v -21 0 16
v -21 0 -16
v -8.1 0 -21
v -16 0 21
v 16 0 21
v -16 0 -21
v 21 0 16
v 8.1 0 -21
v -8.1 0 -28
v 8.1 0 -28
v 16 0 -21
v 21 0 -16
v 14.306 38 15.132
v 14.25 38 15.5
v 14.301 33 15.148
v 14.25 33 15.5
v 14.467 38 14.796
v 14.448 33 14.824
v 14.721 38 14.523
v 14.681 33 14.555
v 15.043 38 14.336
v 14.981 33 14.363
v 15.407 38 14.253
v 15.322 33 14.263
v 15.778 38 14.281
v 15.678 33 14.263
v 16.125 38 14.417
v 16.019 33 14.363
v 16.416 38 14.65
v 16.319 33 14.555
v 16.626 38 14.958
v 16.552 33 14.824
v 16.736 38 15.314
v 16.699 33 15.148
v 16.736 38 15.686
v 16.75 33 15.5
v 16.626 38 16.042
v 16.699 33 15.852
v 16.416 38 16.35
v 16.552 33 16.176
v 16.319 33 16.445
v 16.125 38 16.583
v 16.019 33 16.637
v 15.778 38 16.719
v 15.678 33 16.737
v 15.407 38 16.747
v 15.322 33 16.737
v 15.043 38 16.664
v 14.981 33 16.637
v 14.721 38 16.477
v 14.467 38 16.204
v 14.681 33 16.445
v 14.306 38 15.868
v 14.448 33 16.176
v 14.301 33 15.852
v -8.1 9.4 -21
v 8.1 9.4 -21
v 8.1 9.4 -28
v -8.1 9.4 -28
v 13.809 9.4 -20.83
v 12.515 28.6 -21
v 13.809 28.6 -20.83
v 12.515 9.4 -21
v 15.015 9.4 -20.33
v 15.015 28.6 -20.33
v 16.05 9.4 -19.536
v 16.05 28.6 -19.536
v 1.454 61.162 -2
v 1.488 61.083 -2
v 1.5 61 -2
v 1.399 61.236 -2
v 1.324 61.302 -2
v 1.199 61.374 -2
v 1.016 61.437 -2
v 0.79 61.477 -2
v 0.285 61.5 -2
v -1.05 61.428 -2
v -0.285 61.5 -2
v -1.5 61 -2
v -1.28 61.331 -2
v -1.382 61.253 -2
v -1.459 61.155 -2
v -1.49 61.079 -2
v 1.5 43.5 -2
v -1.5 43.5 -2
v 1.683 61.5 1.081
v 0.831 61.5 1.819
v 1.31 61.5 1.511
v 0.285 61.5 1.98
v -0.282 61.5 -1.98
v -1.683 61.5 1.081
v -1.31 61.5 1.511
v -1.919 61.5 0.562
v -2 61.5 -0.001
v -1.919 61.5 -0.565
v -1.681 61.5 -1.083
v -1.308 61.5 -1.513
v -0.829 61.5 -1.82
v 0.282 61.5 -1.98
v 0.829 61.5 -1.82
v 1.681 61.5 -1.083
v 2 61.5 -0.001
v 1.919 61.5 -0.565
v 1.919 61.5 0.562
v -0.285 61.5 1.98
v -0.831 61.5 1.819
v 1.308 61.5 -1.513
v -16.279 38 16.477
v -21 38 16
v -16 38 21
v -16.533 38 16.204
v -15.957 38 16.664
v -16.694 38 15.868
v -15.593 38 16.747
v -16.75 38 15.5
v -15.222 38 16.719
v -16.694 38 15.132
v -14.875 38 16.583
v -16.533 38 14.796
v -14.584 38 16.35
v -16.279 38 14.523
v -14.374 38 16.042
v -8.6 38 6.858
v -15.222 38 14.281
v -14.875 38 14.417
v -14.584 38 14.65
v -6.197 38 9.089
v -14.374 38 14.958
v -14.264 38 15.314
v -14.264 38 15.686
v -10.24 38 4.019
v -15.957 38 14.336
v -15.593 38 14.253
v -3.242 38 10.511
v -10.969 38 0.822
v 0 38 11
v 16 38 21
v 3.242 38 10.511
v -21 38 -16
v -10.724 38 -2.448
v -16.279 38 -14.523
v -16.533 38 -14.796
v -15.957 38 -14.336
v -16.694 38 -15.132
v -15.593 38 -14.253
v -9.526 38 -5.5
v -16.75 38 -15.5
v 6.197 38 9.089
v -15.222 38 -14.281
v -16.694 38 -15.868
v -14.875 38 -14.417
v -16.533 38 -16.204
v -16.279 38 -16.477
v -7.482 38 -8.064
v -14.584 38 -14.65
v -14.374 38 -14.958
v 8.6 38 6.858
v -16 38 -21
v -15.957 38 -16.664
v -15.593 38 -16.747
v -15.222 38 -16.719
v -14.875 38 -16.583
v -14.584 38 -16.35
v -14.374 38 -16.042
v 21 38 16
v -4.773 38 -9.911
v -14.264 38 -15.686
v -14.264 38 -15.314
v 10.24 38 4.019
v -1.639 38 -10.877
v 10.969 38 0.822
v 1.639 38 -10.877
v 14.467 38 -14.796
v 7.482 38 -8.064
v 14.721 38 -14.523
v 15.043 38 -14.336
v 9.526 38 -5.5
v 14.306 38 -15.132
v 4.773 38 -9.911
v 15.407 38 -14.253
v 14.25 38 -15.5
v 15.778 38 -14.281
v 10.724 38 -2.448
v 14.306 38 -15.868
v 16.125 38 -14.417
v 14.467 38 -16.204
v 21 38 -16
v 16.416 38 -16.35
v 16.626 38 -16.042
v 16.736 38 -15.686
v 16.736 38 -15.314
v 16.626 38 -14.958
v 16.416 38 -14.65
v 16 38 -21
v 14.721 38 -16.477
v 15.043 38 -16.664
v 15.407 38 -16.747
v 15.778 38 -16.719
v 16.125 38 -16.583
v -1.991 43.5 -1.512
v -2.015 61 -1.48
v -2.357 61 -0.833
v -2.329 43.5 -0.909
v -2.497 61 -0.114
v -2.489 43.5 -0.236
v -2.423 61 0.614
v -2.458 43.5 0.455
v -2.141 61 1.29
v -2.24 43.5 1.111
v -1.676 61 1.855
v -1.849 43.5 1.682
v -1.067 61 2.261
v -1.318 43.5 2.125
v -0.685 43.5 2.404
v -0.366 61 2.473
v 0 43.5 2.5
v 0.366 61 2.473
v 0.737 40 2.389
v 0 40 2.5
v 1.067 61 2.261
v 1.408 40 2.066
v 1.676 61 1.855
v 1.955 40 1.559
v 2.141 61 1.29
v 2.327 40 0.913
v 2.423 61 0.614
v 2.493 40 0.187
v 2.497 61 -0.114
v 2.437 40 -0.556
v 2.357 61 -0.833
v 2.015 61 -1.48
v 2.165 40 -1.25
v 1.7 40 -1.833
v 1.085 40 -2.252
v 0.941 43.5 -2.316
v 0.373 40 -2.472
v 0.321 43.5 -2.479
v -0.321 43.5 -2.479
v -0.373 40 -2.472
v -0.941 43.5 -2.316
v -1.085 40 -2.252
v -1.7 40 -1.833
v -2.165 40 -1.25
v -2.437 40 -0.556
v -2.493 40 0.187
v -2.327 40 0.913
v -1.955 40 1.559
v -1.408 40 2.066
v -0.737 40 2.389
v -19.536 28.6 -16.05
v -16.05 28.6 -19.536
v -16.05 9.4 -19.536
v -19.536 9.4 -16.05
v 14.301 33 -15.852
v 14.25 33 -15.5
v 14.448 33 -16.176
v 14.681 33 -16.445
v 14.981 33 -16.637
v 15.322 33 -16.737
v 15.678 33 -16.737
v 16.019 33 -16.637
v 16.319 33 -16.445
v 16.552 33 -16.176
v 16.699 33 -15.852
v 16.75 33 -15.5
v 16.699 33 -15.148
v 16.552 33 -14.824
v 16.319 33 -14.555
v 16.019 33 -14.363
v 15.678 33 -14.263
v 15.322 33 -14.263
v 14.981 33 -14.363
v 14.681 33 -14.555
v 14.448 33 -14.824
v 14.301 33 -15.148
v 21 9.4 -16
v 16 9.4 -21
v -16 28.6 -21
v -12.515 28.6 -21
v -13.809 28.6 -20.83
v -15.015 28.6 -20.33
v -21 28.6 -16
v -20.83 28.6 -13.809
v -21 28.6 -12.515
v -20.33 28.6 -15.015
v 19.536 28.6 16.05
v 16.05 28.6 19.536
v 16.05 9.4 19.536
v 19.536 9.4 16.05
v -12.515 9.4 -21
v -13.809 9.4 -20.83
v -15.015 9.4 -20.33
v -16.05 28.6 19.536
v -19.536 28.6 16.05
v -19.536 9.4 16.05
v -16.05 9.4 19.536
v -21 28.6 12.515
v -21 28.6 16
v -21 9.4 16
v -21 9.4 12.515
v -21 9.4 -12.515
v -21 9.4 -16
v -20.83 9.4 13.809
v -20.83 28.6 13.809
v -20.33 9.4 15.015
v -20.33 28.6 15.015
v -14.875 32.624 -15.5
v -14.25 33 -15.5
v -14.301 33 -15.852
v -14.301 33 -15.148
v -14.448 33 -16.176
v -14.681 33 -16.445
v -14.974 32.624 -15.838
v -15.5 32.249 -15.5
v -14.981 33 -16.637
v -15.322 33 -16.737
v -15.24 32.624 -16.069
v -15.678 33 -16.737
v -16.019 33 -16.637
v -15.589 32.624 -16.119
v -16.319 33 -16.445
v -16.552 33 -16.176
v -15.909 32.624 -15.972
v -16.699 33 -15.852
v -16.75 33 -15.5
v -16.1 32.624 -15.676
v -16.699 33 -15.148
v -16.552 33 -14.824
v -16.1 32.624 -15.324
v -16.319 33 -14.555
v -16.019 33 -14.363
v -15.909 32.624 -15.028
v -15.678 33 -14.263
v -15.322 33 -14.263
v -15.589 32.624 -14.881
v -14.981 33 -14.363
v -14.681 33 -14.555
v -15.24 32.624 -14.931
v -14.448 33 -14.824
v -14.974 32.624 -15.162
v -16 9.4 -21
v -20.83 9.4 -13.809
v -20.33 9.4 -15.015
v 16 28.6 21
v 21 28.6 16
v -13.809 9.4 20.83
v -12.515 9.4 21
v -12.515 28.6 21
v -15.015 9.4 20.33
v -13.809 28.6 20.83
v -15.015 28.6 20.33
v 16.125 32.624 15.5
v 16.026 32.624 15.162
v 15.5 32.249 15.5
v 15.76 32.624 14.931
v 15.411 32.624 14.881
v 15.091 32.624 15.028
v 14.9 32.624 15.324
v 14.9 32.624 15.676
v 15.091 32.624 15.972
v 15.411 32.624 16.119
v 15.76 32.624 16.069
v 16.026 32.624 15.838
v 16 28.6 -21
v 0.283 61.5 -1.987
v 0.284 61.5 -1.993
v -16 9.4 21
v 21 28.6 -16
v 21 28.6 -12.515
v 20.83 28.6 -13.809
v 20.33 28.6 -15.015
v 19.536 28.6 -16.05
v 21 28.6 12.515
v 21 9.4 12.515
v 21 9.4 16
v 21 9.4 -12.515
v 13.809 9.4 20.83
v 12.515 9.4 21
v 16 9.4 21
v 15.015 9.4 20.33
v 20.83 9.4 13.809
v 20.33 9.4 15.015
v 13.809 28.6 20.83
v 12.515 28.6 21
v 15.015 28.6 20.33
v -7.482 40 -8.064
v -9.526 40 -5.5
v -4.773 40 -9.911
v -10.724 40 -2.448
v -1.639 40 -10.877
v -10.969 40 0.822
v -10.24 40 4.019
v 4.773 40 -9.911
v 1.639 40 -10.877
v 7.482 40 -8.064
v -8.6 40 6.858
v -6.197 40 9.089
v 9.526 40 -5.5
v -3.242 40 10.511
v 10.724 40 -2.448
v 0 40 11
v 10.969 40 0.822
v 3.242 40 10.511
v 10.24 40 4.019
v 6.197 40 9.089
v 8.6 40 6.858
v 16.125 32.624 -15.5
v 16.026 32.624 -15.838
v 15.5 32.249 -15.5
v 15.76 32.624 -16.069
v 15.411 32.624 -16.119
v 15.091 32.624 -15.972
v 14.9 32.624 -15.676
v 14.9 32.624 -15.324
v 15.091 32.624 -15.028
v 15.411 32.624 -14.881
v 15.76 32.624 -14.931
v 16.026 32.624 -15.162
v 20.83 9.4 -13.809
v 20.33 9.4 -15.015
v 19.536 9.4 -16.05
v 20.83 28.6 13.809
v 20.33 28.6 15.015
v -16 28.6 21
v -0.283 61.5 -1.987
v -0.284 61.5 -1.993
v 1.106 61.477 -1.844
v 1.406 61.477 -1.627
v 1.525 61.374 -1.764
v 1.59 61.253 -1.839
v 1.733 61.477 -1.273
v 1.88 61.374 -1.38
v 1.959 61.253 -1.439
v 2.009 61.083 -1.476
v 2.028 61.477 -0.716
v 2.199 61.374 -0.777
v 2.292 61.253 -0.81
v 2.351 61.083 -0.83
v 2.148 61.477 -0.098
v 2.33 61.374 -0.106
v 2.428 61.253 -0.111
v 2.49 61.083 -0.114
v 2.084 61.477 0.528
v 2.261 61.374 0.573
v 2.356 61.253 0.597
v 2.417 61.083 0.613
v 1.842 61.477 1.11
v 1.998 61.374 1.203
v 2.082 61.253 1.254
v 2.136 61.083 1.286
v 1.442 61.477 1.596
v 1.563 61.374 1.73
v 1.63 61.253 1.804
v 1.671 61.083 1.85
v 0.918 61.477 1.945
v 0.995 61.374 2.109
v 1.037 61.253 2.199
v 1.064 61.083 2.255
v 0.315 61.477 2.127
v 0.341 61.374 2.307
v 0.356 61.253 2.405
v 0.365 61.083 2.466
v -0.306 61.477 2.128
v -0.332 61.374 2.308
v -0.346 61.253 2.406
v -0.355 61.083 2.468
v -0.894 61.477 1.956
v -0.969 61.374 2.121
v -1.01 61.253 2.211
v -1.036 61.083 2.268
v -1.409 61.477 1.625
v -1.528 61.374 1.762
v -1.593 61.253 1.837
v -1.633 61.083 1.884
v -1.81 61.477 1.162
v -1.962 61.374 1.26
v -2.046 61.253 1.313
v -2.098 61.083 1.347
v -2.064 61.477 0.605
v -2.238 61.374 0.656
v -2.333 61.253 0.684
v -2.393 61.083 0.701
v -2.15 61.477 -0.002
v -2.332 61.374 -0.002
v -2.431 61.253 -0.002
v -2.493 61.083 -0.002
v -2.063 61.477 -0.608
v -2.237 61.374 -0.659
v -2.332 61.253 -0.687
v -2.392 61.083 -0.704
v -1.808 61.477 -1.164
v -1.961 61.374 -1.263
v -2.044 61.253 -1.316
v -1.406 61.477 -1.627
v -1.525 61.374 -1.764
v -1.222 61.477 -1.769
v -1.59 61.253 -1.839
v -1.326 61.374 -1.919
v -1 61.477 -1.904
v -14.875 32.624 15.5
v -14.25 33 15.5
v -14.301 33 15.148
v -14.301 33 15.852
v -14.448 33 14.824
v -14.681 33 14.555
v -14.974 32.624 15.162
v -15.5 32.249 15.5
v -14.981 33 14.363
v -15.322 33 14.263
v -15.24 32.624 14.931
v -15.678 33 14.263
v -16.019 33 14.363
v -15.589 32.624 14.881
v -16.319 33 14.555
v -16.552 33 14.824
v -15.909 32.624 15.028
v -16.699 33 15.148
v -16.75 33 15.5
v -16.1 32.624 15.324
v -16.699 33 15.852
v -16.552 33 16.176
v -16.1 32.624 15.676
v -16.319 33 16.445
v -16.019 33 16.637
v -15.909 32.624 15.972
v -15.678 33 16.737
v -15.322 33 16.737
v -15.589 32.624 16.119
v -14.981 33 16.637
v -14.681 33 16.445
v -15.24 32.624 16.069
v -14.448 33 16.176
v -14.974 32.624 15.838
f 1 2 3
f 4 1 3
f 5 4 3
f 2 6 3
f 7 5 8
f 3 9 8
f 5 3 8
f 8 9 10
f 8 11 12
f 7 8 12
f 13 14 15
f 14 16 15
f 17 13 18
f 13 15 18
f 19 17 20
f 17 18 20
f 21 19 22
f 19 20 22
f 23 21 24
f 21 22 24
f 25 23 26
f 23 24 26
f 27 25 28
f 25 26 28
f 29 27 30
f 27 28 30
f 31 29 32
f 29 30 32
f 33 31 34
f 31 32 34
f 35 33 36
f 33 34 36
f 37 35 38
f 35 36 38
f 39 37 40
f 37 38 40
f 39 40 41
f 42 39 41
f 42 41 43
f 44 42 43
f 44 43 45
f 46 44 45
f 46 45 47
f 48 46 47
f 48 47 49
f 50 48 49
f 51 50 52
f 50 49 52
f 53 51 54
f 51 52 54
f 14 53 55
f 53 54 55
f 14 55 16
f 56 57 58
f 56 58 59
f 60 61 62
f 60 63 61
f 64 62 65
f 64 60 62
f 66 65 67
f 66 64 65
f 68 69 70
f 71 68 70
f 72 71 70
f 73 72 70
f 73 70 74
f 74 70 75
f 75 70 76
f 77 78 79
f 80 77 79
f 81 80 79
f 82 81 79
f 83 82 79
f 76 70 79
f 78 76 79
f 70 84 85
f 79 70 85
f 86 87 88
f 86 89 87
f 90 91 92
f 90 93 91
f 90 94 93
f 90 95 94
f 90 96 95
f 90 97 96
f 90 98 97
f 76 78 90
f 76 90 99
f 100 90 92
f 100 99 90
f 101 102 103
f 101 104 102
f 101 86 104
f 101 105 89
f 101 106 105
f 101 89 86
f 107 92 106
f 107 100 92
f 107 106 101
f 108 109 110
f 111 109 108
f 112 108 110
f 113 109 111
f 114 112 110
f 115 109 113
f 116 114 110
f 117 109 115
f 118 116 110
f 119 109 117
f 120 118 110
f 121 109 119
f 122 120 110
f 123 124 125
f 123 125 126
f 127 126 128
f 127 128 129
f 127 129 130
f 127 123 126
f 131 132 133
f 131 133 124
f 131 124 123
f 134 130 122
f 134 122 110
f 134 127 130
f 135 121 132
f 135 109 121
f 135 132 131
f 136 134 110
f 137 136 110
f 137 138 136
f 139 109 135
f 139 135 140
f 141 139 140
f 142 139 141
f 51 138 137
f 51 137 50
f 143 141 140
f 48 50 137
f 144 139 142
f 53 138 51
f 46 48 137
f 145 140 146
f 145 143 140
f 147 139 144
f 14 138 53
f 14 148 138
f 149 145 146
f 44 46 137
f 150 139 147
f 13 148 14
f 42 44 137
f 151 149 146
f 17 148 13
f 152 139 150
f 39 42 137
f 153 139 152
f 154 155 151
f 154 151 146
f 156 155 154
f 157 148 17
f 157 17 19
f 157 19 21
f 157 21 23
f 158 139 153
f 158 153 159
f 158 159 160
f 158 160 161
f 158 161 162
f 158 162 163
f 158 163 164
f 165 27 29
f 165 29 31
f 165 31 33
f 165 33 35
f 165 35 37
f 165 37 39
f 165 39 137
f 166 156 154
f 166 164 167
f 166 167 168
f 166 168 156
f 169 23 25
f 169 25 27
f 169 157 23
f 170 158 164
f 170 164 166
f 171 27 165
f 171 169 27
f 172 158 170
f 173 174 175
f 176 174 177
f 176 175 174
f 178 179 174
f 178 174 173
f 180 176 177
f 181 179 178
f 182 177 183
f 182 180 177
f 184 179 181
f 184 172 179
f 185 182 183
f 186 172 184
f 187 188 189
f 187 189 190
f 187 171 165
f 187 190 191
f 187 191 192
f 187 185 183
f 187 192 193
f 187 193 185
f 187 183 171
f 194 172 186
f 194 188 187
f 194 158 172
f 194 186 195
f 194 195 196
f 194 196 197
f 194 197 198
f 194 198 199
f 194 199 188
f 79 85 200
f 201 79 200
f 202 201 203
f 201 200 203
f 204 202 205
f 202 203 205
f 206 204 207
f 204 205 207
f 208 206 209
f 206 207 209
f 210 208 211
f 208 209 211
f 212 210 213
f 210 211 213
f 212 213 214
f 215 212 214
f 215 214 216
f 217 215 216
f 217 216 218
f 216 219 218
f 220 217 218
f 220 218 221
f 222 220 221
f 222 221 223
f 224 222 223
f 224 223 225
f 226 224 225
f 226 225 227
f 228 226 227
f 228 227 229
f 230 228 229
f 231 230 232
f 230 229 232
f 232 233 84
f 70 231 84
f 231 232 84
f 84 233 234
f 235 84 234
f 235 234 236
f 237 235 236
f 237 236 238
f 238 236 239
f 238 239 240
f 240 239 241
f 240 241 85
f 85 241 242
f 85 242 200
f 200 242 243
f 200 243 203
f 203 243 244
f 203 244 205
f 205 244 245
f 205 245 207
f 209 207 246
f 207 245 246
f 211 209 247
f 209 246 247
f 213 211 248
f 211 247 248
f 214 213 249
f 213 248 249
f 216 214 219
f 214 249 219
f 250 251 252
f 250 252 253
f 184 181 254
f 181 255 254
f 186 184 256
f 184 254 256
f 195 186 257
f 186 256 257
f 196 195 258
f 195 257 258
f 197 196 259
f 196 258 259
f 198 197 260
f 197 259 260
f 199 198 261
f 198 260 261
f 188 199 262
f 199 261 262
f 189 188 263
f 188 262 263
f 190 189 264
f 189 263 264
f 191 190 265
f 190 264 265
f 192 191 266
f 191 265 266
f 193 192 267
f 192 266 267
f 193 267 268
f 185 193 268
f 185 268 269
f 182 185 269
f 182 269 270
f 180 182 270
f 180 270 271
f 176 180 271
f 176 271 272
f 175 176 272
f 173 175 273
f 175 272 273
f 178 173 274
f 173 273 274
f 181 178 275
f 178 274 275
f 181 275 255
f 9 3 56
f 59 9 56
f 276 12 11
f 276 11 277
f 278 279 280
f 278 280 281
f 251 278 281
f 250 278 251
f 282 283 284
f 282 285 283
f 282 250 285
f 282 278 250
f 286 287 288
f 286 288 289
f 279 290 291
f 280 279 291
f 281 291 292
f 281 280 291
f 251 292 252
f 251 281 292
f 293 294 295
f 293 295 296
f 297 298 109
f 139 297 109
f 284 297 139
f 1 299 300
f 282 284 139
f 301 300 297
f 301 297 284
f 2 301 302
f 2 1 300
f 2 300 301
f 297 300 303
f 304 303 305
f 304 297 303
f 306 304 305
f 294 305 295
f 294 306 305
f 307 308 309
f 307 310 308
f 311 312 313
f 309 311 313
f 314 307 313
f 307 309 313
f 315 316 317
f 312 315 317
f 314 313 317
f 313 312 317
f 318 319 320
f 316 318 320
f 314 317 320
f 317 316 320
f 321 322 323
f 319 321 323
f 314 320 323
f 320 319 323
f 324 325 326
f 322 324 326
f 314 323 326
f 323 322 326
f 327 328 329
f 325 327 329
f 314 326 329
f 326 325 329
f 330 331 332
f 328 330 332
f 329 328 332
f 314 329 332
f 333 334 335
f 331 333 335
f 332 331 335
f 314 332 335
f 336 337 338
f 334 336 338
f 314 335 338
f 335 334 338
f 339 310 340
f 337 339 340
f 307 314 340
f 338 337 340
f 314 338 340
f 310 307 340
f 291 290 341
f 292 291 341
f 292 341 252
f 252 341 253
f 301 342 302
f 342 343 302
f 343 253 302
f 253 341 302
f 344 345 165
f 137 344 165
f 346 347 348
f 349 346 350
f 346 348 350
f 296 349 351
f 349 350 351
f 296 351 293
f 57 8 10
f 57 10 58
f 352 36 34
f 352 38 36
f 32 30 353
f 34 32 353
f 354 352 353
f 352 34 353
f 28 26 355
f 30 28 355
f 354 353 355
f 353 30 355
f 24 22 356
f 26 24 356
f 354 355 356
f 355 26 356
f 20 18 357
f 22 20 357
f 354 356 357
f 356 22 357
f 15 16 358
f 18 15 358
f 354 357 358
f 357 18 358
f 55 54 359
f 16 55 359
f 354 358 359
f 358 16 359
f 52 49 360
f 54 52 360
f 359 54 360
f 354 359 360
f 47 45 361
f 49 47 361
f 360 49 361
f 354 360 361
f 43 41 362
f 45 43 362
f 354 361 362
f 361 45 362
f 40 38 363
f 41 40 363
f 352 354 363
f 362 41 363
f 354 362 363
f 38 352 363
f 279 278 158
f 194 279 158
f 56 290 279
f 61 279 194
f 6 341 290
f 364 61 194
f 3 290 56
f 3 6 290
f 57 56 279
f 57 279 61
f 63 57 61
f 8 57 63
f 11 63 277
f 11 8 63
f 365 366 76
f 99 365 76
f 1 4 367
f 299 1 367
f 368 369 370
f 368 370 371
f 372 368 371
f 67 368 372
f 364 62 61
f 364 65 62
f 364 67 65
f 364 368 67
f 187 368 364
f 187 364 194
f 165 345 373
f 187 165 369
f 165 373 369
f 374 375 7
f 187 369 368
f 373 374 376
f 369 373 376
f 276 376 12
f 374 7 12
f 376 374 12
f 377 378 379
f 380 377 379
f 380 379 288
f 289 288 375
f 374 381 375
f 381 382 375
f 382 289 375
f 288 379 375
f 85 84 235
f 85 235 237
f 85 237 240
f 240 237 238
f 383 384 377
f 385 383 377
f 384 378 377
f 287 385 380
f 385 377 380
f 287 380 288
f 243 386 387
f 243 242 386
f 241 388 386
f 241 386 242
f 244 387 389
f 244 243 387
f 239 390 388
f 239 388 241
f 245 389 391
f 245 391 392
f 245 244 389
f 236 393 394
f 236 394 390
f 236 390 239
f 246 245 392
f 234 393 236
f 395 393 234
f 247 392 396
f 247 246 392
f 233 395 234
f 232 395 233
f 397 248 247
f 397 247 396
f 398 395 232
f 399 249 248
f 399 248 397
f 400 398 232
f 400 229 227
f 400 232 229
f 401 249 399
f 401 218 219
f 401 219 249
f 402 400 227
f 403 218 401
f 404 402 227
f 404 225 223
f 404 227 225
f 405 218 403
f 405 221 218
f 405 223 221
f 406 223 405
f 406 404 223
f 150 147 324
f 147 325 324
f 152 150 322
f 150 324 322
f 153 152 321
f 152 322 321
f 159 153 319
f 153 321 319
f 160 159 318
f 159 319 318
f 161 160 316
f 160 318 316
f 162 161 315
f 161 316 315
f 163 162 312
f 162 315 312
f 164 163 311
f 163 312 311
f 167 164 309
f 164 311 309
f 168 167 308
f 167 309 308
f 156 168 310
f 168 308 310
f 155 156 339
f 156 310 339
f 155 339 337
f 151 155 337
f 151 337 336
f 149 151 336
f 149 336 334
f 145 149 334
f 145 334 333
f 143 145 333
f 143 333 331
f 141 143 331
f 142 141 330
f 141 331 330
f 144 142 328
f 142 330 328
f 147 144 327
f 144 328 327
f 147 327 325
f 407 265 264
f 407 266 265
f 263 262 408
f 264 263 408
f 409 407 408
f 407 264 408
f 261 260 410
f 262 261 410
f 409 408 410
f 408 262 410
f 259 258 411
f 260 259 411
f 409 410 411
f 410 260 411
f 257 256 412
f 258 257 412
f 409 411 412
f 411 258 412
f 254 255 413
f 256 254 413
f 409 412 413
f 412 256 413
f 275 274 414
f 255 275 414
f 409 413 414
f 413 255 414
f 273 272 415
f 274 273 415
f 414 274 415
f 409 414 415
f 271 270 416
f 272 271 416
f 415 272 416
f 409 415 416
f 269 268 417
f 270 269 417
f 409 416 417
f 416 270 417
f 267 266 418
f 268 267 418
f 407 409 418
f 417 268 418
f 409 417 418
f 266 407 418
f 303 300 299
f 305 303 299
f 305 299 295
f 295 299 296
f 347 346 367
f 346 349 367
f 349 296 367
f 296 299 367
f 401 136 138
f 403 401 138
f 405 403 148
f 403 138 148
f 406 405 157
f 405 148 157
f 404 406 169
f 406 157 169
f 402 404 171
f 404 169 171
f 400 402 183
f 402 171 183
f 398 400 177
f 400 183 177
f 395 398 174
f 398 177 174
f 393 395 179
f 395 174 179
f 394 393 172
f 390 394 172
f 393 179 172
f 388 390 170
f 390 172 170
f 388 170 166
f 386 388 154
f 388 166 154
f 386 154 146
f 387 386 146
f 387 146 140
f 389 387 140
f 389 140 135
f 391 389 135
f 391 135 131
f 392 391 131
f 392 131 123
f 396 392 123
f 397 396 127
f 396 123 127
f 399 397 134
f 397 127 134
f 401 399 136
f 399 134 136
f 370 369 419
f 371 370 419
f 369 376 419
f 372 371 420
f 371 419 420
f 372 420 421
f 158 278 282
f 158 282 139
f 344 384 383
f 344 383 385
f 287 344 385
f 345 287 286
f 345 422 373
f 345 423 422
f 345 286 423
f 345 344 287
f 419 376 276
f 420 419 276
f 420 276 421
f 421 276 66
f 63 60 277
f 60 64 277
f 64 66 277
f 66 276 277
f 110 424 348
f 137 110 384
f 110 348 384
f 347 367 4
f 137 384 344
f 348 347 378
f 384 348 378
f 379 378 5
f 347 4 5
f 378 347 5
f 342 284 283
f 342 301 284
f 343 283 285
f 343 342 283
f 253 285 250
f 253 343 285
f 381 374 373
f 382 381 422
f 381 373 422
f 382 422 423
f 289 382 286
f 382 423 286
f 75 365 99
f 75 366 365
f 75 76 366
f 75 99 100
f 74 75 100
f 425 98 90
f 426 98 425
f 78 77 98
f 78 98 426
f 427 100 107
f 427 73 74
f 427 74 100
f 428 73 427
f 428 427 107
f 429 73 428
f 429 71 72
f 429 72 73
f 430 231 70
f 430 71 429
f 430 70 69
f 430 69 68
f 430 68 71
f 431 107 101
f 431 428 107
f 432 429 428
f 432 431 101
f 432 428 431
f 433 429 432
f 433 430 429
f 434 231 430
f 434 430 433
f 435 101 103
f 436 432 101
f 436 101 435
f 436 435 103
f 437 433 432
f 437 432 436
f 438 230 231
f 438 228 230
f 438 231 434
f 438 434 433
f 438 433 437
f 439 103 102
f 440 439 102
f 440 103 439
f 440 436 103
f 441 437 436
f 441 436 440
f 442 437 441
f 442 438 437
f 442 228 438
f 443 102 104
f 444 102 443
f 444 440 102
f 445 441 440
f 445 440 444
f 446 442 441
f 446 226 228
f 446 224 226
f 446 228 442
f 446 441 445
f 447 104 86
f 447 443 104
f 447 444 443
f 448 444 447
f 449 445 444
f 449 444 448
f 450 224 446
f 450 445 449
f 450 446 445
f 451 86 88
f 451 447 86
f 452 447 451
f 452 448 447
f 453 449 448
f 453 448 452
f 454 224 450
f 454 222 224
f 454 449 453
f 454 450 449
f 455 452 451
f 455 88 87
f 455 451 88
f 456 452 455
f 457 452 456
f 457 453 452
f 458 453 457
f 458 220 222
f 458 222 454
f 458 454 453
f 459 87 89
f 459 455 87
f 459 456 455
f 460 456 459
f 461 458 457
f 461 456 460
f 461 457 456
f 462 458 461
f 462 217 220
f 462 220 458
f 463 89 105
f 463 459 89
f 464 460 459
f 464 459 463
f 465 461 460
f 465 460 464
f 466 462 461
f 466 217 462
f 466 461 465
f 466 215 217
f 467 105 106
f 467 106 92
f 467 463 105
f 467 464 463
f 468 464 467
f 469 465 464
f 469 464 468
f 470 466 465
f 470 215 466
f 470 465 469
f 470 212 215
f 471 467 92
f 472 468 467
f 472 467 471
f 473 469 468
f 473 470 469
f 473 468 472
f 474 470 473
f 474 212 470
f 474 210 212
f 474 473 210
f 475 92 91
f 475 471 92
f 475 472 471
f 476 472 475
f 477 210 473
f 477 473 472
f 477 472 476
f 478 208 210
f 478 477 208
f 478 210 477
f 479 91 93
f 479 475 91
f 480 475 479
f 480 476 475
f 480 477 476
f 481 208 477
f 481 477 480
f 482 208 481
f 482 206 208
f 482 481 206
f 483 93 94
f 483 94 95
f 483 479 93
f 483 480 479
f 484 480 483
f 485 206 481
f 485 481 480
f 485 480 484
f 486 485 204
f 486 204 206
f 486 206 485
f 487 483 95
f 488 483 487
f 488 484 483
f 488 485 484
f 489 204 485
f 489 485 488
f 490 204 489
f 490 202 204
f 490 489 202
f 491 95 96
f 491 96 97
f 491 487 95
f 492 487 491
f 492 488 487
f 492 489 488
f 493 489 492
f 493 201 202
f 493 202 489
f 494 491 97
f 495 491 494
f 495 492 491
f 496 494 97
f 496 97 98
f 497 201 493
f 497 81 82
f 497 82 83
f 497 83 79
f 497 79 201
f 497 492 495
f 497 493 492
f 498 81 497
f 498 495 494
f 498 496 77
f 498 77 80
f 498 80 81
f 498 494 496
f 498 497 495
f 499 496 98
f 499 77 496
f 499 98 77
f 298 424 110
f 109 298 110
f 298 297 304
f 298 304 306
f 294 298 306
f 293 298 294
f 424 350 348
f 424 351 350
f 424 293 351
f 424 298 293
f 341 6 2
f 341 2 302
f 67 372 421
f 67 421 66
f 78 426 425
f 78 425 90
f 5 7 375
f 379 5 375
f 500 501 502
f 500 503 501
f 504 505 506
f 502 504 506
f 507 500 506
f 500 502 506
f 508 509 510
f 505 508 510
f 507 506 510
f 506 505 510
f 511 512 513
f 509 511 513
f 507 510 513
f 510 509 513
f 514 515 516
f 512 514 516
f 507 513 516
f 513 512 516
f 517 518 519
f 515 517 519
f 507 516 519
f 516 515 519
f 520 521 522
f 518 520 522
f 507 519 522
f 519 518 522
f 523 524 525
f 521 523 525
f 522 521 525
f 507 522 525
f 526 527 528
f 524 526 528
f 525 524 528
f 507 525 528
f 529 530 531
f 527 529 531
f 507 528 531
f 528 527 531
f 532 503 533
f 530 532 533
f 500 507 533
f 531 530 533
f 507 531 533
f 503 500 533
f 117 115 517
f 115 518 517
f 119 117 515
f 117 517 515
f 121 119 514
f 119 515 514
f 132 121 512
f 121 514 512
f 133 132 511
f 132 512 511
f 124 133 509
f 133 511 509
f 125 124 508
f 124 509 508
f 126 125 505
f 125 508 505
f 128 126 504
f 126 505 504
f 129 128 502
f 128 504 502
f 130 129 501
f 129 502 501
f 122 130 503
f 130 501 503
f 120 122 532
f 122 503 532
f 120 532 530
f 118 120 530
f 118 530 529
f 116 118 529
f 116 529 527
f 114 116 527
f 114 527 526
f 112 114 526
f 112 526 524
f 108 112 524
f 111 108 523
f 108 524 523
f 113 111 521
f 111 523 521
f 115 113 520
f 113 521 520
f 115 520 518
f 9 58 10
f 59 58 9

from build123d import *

# Parameters (mm, degrees)
SKETCH1_W             = 42
SKETCH1_H             = 42
BOSS_EXTRUDE1_DEPTH   = 38
SKETCH2_R             = 11
BOSS_EXTRUDE2_DEPTH   = 2
SKETCH3_R             = 2.5
BOSS_EXTRUDE3_DEPTH   = 3.5
BOSS_EXTRUDE4_DEPTH   = 18
M3_TAPPED_HOLE1_D     = 2.5
M3_TAPPED_HOLE1_DEPTH = 5
M3_TAPPED_HOLE1_TIP   = 0.751075774
CHAMFER1_SIZE         = 5
SKETCH11_W            = 10
SKETCH11_H            = 19.2
CUT_EXTRUDE2_DEPTH    = 1
SKETCH12_W            = 10
SKETCH12_H            = 19.2
CUT_EXTRUDE3_DEPTH    = 1
SKETCH13_W            = 10
SKETCH13_H            = 19.2
CUT_EXTRUDE4_DEPTH    = 1
SKETCH14_W            = 10
SKETCH14_H            = 19.2
CUT_EXTRUDE5_DEPTH    = 1
FILLET1_R             = 5
SKETCH15_W            = 16.2
SKETCH15_H            = 9.4
BOSS_EXTRUDE5_DEPTH   = 7
FILLET3_R             = 0.5


with BuildPart() as part:
    # Sketch1 → Boss-Extrude1 (new body)
    with BuildSketch(Plane(origin=(0, 0, 0), x_dir=(1, 0, 0), z_dir=(0, 1, 0))):
        Rectangle(SKETCH1_W, SKETCH1_H)
    extrude(amount=BOSS_EXTRUDE1_DEPTH)

    # Sketch2 → Boss-Extrude2 (add)
    with BuildSketch(Plane(origin=(0, 38, 0), x_dir=(1, 0, 0), z_dir=(0, 1, 0))):
        with Locations(Location((0, 0, 0), (0, 0, 270))):
            Circle(SKETCH2_R)
    extrude(amount=BOSS_EXTRUDE2_DEPTH)

    # Sketch3 → Boss-Extrude3 (add)
    with BuildSketch(Plane(origin=(0, 40, 0), x_dir=(1, 0, 0), z_dir=(0, 1, 0))):
        with Locations(Location((0, 0, 0), (0, 0, 270))):
            Circle(SKETCH3_R)
    extrude(amount=BOSS_EXTRUDE3_DEPTH)

    # Sketch4 → Boss-Extrude4 (add)
    with BuildSketch(Plane(origin=(0, 43.5, 0), x_dir=(1, 0, 0), z_dir=(0, 1, 0))):
        with BuildLine():
            ThreePointArc((-1.5, 2), (-2.371708245, -0.790569415), (0, -2.5))
            Line((0, -2.5), (0, 2))
            Line((0, 2), (-1.5, 2))
        make_face()
        with BuildLine():
            Line((0, 2), (0, -2.5))
            ThreePointArc((0, -2.5), (1.767766953, -1.767766953), (2.5, 0))
            ThreePointArc((2.5, 0), (2.236067977, 1.118033989), (1.5, 2))
            Line((1.5, 2), (0, 2))
        make_face()
    extrude(amount=BOSS_EXTRUDE4_DEPTH)

    # M3 Tapped Hole1
    with Locations(Plane(origin=(0, 38, 0), x_dir=(1, 0, 0), z_dir=(0, 1, 0))):
        with Locations((-15.5, 15.5), (15.5, 15.5), (15.5, -15.5), (-15.5, -15.5)):
            Hole(M3_TAPPED_HOLE1_D / 2, depth=M3_TAPPED_HOLE1_DEPTH)
            with Locations((0, 0, -(M3_TAPPED_HOLE1_DEPTH + M3_TAPPED_HOLE1_TIP / 2))):  # 118° drill point
                Cone(0, M3_TAPPED_HOLE1_D / 2, M3_TAPPED_HOLE1_TIP, mode=Mode.SUBTRACT)

    # Chamfer1
    chamfer1_edges = [part.edges().sort_by_distance(p)[0] for p in [
        (-21, 19, -21),
        (21, 19, -21),
        (21, 19, 21),
        (-21, 19, 21),
    ]]
    chamfer(chamfer1_edges, length=CHAMFER1_SIZE)

    # Sketch11 → Cut-Extrude2 (cut)
    with BuildSketch(Plane(origin=(18.5, 0, 18.5), x_dir=(0.7071067811865485, 0, -0.7071067811865467), z_dir=(0.7071067811865467, 0, 0.7071067811865485))):
        with Locations((0, 19)):
            Rectangle(SKETCH11_W, SKETCH11_H)
    extrude(amount=-CUT_EXTRUDE2_DEPTH, mode=Mode.SUBTRACT)

    # Sketch12 → Cut-Extrude3 (cut)
    with BuildSketch(Plane(origin=(-18.5, 0, 18.5), x_dir=(0.7071067811865465, 0, 0.7071067811865487), z_dir=(-0.7071067811865487, 0, 0.7071067811865465))):
        with Locations((0, 19)):
            Rectangle(SKETCH12_W, SKETCH12_H)
    extrude(amount=-CUT_EXTRUDE3_DEPTH, mode=Mode.SUBTRACT)

    # Sketch13 → Cut-Extrude4 (cut)
    with BuildSketch(Plane(origin=(-18.5, 0, -18.5), x_dir=(-0.7071067811865485, 0, 0.7071067811865467), z_dir=(-0.7071067811865467, 0, -0.7071067811865485))):
        with Locations((0, 19)):
            Rectangle(SKETCH13_W, SKETCH13_H)
    extrude(amount=-CUT_EXTRUDE4_DEPTH, mode=Mode.SUBTRACT)

    # Sketch14 → Cut-Extrude5 (cut)
    with BuildSketch(Plane(origin=(18.5, 0, -18.5), x_dir=(-0.7071067811865467, 0, -0.7071067811865485), z_dir=(0.7071067811865485, 0, -0.7071067811865467))):
        with Locations((0, 19)):
            Rectangle(SKETCH14_W, SKETCH14_H)
    extrude(amount=-CUT_EXTRUDE5_DEPTH, mode=Mode.SUBTRACT)

    # Fillet1
    fillet1_edges = [part.edges().sort_by_distance(p)[0] for p in [
        (-14.585786438, 19, 21),
        (-21, 19, 14.585786438),
        (-14.585786438, 19, -21),
        (-21, 19, -14.585786438),
        (14.585786438, 19, -21),
        (21, 19, -14.585786438),
        (21, 19, 14.585786438),
        (14.585786438, 19, 21),
    ]]
    fillet(fillet1_edges, radius=FILLET1_R)

    # Sketch15 → Boss-Extrude5 (add)
    with BuildSketch(Plane(origin=(0, 0, -21), x_dir=(-1, 0, 0), z_dir=(0, 0, -1))):
        with Locations((0, 4.7)):
            Rectangle(SKETCH15_W, SKETCH15_H)
    extrude(amount=BOSS_EXTRUDE5_DEPTH)

    # Fillet3
    # the kernel refuses this fillet: 0.5 mm, written as the material it takes off along each edge
    with BuildSketch(Plane(origin=(0, 61.5, 0), x_dir=(0.14099255813885567, 0, -0.990010655775715), z_dir=(-0.990010655775715, 0, -0.14099255813885567))) as fillet3_piece_1:
        with BuildLine():
            CenterArc((2.5 - FILLET3_R, FILLET3_R), FILLET3_R, 270, 90)
            Line((2.5 - FILLET3_R, 0), (2.5, 0))
            Line((2.5, 0), (2.5, FILLET3_R))
        make_face()
    revolve(axis=Axis((0, 61.5, 0), (0, -1, 0)), revolution_arc=343.789429262, mode=Mode.SUBTRACT)


solid = part.part
